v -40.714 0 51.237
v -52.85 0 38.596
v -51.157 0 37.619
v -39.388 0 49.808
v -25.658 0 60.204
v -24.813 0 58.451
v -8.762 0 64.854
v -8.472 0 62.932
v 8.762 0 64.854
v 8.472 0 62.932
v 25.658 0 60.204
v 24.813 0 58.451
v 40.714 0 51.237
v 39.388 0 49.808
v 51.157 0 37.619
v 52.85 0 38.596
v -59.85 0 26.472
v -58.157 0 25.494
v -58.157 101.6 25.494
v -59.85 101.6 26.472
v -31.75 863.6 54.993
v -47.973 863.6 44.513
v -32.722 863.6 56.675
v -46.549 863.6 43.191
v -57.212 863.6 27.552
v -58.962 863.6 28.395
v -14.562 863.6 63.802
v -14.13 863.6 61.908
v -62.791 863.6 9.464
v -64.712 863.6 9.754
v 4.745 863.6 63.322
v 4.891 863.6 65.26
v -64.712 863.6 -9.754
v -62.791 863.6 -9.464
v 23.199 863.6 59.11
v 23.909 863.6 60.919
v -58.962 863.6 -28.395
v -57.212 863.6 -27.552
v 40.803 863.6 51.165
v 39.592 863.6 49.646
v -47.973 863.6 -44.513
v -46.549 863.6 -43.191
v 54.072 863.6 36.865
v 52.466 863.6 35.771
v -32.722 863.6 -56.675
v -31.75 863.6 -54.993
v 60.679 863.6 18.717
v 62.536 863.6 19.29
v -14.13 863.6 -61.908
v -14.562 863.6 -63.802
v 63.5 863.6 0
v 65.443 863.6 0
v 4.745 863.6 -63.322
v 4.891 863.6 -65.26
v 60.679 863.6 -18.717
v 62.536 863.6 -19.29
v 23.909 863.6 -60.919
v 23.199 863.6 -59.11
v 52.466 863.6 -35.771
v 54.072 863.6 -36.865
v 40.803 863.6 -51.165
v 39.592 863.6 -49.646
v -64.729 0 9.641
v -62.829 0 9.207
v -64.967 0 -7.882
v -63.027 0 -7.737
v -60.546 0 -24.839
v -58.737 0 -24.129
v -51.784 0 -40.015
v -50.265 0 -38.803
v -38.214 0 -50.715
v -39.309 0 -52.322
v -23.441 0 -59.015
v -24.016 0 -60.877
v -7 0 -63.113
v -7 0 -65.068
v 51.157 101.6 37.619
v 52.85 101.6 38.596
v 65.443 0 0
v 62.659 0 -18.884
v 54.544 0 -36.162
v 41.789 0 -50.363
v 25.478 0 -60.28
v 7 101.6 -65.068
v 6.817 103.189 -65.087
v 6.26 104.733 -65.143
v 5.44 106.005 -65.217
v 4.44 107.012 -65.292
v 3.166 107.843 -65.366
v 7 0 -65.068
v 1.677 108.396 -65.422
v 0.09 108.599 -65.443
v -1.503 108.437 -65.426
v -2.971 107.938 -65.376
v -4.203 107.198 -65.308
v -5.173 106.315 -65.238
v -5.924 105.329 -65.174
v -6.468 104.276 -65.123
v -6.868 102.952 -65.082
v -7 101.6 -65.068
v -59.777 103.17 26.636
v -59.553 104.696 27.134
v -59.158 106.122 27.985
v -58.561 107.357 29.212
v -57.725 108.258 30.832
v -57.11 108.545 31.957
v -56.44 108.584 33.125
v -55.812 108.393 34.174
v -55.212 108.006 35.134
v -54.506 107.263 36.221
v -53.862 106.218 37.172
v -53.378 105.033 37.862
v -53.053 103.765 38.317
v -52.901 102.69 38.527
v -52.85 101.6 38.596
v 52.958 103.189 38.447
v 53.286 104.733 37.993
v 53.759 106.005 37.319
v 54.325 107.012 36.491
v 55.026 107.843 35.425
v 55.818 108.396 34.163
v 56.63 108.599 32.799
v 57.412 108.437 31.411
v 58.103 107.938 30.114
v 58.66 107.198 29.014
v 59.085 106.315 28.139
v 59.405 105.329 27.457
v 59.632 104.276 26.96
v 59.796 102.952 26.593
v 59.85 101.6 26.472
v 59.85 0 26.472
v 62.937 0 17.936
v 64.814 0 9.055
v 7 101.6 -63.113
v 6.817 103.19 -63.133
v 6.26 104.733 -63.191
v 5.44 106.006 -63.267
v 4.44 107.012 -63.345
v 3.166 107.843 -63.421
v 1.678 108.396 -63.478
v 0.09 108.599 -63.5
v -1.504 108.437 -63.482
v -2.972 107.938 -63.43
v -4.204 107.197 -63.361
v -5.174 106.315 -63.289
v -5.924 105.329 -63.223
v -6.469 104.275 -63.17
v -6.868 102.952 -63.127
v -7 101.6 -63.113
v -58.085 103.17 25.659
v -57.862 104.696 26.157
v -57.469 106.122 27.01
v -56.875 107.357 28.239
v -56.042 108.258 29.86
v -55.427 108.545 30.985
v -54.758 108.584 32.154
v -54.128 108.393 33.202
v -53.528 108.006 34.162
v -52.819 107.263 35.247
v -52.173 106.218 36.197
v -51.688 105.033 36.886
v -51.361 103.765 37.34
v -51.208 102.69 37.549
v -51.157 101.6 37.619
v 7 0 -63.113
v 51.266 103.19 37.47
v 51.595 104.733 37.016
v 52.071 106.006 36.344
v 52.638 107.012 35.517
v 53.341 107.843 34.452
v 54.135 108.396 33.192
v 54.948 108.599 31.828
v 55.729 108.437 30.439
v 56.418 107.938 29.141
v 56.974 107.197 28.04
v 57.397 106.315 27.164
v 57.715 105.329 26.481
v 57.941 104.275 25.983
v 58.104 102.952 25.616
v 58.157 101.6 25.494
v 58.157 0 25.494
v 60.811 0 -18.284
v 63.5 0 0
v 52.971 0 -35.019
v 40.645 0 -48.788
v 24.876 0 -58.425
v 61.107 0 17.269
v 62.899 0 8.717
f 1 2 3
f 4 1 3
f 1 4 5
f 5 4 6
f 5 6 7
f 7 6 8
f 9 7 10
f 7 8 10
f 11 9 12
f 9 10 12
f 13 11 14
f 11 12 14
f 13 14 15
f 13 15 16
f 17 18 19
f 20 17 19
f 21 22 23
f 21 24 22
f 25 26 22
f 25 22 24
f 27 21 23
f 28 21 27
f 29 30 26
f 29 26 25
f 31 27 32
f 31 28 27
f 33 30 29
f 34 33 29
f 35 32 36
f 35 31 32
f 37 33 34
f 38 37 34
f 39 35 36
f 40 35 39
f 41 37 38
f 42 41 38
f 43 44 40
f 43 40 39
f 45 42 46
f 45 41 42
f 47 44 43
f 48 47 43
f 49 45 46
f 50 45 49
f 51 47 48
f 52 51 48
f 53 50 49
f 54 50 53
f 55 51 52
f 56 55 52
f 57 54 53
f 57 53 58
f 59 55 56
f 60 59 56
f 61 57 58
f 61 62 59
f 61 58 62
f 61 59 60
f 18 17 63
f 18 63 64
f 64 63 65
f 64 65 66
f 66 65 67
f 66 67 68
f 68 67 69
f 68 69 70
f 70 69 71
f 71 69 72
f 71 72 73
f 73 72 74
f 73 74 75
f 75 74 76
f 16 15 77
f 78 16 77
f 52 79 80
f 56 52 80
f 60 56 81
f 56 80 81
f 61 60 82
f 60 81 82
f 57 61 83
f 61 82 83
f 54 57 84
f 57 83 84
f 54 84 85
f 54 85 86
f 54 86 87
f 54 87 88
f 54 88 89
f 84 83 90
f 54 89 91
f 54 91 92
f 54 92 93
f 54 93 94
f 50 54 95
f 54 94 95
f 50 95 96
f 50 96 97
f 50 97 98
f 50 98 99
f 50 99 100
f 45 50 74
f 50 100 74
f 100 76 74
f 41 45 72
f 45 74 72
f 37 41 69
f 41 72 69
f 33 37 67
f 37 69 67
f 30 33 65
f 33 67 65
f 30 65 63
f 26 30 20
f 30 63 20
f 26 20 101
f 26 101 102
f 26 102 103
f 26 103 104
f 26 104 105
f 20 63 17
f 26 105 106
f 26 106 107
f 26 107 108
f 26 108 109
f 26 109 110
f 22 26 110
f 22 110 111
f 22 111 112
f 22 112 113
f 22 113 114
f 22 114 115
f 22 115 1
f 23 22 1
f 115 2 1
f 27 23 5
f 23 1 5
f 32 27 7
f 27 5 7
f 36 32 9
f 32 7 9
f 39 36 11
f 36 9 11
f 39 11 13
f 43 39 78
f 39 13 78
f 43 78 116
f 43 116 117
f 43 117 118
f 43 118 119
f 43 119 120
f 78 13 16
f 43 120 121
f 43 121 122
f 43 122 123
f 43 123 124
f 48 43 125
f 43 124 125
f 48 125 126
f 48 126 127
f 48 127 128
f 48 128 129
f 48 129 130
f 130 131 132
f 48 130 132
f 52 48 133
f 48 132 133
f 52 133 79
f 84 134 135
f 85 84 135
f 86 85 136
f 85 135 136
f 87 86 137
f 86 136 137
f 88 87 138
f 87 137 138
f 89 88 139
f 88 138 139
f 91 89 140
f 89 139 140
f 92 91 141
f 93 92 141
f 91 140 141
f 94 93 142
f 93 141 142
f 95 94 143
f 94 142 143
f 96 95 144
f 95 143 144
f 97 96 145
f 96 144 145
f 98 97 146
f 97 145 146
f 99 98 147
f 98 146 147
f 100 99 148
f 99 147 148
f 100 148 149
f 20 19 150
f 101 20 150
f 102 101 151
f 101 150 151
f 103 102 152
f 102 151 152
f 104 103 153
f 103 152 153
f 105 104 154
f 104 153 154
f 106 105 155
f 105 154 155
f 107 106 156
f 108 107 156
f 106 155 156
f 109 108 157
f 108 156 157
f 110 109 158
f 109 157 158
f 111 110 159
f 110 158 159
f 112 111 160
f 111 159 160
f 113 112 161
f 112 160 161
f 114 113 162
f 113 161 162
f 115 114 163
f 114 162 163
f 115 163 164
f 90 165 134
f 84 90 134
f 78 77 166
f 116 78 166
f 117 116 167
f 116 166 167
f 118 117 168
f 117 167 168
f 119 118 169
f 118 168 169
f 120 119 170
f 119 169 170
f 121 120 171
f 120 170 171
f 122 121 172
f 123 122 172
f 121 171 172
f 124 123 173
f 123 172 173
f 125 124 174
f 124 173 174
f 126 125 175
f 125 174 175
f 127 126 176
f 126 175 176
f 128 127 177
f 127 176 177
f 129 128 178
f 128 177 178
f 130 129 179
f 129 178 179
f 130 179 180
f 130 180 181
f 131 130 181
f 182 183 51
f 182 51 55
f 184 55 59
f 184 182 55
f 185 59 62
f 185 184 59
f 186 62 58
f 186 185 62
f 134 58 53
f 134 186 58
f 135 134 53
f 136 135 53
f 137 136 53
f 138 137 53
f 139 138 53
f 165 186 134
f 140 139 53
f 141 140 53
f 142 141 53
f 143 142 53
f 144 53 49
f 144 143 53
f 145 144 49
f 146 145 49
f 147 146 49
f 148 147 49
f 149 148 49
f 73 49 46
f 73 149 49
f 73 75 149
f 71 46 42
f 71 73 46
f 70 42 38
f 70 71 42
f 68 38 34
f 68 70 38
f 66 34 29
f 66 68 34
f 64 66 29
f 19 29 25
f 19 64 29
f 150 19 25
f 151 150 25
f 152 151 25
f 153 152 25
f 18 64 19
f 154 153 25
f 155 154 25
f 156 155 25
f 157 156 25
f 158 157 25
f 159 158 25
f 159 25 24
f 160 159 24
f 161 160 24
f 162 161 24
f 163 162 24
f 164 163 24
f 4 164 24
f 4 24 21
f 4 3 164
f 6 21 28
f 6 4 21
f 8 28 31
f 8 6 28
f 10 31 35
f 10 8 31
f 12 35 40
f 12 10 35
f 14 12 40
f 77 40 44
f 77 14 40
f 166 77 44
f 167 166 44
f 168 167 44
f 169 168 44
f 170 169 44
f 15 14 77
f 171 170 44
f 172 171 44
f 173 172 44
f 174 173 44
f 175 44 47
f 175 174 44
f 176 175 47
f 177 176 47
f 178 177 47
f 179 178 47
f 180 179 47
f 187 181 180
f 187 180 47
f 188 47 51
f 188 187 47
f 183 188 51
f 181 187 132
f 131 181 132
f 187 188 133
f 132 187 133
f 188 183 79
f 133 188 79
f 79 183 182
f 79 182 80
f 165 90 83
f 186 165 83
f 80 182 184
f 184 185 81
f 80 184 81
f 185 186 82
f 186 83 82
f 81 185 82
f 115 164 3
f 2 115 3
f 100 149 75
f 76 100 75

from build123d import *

# Parameters (mm, degrees)
SKETCH1_R           = 65.4431
SKETCH1_R_2         = 63.5
BOSS_EXTRUDE1_DEPTH = 863.6
CUT_EXTRUDE1_DEPTH  = 66.4431
CIRPATTERN1_COUNT   = 3


with BuildPart() as part:
    # Sketch1 → Boss-Extrude1 (new body)
    with BuildSketch(Plane(origin=(0, 0, 0), x_dir=(1, 0, 0), z_dir=(0, 1, 0))):
        Circle(SKETCH1_R)
        Circle(SKETCH1_R_2, mode=Mode.SUBTRACT)
    extrude(amount=BOSS_EXTRUDE1_DEPTH)

    # Sketch2 → Cut-Extrude1 (cut, through all)
    with BuildSketch(Plane.XY):
        with BuildLine():
            Line((7, 0), (7, 101.6))
            ThreePointArc((7, 101.6), (0, 108.6), (-7, 101.6))
            Line((-7, 101.6), (-7, 0))
            Line((-7, 0), (7, 0))
        make_face()
    cut_extrude1 = extrude(amount=-CUT_EXTRUDE1_DEPTH, mode=Mode.SUBTRACT)

    # CirPattern1: Cut-Extrude1 ×3 about axis
    cirpattern1_axis = Axis((0, 0, 0), (0, 1, 0))
    for i in range(1, CIRPATTERN1_COUNT):
        add(cut_extrude1.rotate(cirpattern1_axis, i * 360 / CIRPATTERN1_COUNT), mode=Mode.SUBTRACT)


solid = part.part
